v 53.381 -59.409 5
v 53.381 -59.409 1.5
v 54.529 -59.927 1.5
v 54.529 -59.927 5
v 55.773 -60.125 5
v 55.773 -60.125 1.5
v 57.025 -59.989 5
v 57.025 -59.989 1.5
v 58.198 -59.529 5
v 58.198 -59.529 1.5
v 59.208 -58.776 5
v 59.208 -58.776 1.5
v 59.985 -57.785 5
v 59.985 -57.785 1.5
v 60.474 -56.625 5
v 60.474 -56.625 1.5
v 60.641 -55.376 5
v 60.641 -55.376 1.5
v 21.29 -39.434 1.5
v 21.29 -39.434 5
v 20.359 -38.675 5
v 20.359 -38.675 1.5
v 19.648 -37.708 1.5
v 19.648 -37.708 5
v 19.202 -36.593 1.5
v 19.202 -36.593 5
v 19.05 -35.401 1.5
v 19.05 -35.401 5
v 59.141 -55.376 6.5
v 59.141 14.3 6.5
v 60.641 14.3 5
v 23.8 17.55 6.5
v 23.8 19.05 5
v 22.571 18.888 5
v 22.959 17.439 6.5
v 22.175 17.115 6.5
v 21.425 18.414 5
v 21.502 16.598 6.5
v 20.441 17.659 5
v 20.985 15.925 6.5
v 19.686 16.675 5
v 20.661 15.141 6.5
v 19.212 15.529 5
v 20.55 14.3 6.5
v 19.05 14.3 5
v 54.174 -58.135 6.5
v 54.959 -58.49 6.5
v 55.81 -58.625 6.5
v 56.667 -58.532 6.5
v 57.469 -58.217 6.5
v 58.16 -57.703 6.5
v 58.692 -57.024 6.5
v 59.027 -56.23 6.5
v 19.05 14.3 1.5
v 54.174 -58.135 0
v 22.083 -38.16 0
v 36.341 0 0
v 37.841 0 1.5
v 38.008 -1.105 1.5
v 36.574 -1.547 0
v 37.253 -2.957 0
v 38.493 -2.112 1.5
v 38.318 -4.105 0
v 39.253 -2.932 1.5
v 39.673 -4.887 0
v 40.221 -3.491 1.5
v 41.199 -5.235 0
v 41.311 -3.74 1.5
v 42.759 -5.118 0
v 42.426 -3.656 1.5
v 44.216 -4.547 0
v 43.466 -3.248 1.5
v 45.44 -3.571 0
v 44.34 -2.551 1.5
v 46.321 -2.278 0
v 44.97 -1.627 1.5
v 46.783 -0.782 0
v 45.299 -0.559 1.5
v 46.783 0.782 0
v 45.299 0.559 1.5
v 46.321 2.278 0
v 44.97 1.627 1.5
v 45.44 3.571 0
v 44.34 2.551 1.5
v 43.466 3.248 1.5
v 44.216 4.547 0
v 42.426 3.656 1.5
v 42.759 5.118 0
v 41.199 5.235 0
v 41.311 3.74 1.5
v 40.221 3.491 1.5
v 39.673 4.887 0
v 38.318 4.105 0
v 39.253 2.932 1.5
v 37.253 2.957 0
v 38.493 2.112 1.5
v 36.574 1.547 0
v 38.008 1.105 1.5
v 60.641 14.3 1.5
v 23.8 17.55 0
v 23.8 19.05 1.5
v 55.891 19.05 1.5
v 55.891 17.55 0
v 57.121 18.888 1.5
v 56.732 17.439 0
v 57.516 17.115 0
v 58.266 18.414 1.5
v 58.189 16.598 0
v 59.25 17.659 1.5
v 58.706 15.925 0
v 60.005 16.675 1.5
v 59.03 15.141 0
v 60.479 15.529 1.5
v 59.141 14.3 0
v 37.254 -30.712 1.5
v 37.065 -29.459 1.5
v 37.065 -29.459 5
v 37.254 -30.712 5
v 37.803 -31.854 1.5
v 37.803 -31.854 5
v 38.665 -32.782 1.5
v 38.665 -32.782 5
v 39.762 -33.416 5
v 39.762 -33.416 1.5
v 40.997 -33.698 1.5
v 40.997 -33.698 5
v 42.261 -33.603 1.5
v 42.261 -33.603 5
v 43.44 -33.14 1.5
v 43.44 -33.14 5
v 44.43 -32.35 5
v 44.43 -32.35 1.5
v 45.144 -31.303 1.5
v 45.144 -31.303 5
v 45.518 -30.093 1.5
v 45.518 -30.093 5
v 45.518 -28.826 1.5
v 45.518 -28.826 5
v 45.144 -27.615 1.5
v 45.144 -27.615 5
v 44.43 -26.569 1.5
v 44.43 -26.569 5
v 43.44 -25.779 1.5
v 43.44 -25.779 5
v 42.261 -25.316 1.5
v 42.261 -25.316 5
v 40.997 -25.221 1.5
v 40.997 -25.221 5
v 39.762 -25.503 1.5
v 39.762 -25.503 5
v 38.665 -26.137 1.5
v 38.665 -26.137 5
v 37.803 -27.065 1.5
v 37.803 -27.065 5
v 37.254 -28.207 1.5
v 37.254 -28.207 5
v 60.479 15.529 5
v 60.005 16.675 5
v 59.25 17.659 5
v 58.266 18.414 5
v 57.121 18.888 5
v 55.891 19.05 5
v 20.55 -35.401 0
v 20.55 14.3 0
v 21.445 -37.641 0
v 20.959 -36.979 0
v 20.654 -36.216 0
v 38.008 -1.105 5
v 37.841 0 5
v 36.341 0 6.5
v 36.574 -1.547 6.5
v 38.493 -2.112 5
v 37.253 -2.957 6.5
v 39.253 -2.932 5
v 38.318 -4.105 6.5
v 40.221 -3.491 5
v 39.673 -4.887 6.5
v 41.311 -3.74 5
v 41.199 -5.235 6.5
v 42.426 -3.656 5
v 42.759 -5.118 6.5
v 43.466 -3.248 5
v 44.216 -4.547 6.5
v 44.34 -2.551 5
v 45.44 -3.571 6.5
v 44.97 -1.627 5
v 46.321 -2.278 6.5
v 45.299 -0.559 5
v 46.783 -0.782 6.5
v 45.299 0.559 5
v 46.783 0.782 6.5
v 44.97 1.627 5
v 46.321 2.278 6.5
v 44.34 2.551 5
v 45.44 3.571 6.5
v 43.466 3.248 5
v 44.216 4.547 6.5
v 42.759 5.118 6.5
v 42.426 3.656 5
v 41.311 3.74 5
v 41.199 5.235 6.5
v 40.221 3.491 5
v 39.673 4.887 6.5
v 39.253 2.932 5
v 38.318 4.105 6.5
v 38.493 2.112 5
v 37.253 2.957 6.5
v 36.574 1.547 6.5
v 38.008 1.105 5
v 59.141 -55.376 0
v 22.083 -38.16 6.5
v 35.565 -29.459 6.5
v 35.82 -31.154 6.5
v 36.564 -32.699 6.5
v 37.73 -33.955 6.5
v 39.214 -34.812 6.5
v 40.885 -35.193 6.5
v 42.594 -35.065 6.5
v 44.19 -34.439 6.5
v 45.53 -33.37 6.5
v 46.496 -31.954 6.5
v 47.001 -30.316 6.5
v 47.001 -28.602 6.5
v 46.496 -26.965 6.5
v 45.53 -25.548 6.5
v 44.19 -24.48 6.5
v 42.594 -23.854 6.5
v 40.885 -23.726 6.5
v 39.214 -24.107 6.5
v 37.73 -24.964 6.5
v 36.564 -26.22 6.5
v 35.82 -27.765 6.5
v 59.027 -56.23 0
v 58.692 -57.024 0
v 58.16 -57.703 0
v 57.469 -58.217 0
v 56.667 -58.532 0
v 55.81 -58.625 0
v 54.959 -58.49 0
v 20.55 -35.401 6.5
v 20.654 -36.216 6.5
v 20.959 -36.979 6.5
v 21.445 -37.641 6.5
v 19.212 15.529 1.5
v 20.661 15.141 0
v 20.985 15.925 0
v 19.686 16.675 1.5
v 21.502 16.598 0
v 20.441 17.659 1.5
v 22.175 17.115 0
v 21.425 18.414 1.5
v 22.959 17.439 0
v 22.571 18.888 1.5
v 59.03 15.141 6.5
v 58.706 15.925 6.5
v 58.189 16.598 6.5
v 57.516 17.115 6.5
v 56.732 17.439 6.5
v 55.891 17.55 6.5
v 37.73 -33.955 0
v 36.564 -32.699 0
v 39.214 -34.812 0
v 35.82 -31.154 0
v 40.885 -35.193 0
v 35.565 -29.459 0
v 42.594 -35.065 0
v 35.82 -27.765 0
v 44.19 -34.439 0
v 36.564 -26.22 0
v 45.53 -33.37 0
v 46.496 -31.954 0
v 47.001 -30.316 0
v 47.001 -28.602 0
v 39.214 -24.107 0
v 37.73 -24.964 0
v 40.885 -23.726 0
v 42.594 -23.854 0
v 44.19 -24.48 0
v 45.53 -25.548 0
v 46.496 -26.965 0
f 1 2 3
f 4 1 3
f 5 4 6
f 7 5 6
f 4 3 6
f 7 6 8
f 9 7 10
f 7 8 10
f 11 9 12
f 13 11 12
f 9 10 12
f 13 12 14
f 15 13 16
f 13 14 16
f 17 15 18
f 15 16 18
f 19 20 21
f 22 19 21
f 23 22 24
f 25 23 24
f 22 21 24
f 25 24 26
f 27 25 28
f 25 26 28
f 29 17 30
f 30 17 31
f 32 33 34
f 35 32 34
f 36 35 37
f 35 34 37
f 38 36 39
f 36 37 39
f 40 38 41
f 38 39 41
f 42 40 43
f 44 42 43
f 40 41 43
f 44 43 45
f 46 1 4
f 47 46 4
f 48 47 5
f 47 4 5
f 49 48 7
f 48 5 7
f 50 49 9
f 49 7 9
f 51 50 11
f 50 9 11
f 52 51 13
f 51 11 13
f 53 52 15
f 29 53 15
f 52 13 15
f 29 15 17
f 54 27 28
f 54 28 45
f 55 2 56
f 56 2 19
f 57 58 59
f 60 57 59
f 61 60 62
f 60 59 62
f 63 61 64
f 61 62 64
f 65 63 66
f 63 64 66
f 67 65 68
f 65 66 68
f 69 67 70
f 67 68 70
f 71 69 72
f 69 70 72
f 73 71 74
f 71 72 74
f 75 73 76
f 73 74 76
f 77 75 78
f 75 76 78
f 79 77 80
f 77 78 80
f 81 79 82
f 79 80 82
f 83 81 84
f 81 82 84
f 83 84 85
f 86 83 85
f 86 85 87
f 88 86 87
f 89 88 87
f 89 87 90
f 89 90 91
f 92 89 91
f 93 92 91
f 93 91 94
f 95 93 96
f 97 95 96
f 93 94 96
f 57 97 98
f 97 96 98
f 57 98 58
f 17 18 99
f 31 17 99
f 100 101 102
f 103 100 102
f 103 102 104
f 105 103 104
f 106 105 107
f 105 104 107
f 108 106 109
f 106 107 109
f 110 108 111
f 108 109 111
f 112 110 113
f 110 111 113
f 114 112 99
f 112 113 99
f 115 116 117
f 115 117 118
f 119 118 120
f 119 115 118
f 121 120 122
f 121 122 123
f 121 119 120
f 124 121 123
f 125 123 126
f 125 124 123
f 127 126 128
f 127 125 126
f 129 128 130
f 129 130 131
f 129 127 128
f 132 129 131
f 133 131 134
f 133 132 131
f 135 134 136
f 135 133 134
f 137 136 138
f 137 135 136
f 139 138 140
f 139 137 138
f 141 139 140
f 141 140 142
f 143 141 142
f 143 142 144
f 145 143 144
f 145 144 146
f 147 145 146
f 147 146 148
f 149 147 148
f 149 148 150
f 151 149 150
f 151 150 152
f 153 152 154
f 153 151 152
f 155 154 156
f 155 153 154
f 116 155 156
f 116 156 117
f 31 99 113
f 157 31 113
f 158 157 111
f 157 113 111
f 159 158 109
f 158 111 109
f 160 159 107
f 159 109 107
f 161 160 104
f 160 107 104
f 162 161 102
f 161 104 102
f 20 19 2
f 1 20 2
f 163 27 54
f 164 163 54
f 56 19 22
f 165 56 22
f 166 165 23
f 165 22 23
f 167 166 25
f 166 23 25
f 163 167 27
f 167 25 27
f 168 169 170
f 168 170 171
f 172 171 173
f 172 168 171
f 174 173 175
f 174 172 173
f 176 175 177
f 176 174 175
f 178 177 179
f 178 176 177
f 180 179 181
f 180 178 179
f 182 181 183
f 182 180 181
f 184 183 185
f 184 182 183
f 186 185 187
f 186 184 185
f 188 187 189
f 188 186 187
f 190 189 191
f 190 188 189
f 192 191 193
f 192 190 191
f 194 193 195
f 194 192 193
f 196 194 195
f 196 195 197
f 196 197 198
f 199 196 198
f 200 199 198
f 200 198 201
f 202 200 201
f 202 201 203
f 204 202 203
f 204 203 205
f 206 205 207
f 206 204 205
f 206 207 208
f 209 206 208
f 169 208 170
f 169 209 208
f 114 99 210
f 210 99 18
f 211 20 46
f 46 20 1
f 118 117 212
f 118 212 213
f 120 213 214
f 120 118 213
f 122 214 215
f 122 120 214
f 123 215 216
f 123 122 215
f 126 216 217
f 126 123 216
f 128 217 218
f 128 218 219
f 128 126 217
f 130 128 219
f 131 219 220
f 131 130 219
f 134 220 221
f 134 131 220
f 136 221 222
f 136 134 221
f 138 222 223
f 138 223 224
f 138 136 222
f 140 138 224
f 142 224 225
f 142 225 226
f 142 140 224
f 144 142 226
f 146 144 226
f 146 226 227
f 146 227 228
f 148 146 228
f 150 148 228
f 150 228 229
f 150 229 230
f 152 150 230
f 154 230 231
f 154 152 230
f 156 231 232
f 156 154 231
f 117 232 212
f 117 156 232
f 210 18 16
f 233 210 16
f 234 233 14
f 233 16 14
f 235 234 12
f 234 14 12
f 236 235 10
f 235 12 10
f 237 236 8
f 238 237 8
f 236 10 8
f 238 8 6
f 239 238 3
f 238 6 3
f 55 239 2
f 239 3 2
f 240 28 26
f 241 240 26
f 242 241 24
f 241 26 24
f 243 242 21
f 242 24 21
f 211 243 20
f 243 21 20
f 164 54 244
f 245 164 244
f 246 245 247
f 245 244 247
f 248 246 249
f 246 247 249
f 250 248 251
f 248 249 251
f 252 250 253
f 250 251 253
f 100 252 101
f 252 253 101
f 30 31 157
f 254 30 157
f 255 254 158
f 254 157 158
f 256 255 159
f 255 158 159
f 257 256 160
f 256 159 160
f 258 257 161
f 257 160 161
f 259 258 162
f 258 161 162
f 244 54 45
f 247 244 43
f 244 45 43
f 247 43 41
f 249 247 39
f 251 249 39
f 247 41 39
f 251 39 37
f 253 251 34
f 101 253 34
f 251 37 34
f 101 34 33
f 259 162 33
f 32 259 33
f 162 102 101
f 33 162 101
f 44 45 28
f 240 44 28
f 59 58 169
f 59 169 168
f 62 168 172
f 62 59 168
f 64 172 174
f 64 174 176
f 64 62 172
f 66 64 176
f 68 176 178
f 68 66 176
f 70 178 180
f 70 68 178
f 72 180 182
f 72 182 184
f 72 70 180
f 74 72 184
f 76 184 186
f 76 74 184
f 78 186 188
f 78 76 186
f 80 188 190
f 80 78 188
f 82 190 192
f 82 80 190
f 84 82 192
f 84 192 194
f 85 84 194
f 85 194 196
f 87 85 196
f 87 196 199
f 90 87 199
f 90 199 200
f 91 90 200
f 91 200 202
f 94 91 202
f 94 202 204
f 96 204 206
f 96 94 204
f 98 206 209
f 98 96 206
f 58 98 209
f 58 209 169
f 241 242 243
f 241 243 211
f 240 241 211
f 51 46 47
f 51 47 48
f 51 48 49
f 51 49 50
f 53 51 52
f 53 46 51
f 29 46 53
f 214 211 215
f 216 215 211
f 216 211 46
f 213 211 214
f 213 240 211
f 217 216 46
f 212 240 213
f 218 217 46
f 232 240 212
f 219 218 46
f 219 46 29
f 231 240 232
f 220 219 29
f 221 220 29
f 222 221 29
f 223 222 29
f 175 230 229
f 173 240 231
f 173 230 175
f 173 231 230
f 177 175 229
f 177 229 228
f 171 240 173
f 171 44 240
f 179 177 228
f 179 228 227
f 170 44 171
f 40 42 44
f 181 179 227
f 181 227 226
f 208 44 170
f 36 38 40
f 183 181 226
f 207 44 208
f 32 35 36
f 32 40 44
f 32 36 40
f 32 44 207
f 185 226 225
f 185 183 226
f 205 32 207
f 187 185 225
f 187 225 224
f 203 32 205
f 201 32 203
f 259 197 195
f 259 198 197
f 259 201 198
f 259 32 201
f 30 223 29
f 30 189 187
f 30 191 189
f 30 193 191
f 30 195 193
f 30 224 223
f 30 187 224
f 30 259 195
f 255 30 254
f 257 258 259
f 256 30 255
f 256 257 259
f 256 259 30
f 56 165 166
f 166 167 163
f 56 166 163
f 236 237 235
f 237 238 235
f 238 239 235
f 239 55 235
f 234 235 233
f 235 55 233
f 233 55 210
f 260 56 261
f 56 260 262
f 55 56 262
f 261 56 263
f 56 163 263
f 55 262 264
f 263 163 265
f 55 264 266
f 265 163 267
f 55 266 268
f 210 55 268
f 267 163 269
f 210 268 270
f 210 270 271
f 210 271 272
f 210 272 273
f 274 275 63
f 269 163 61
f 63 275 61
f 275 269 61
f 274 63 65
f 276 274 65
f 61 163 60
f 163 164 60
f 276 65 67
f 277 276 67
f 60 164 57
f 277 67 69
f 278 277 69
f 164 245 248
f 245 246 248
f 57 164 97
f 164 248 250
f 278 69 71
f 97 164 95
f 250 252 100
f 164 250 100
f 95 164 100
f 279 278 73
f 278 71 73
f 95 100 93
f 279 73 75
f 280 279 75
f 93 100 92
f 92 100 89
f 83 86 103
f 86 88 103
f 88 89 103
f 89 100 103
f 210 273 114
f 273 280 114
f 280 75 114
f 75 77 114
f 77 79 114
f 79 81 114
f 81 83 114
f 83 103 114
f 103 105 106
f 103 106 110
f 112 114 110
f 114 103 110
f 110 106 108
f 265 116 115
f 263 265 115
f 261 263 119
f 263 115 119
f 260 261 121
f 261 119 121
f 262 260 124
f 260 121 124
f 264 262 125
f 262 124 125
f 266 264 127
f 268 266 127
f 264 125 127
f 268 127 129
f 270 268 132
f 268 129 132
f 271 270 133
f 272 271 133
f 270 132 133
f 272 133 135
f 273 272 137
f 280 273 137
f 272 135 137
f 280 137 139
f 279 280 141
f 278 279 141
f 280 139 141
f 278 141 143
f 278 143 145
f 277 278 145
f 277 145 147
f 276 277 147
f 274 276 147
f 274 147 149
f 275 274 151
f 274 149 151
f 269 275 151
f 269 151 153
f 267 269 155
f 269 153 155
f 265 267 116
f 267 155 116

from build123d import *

# Parameters (mm, degrees)
SKETCH1_R           = 4.25
SKETCH1_R_2         = 3.75
SKETCH1_R_3         = 4.5
BOSS_EXTRUDE1_DEPTH = 6.5
CUT_EXTRUDE1_DEPTH  = 10
FILLET1_R           = 4.75
CHAMFER1_SIZE       = 1.5


with BuildPart() as part:
    # Sketch1 → Boss-Extrude1 (new body)
    with BuildSketch(Plane.XY):
        with BuildLine():
            Line((-11.458079381, -19.05), (53.381074139, -59.408818568))
            ThreePointArc((53.381074139, -59.408818568), (58.197626483, -59.528635467), (60.641156228, -55.376203052))
            Line((60.641156228, -55.376203052), (60.641156228, 14.3))
            ThreePointArc((60.641156228, 14.3), (59.249913439, 17.658757211), (55.891156228, 19.05))
            Line((55.891156228, 19.05), (-13.723477062, 19.05))
            ThreePointArc((-13.723477062, 19.05), (-14.628464695, 18.040083046), (-15.73121772, 18.829304583))
            ThreePointArc((-15.73121772, 18.829304583), (-17.658815789, 17.658815789), (-18.829304583, 15.73121772))
            ThreePointArc((-18.829304583, 15.73121772), (-18.040083046, 14.628464695), (-19.05, 13.723477062))
            Line((-19.05, 13.723477062), (-19.05, 8.996305235))
            ThreePointArc((-19.05, 8.996305235), (-18.034, 7.980305235), (-19.05, 6.964305235))
            Line((-19.05, 6.964305235), (-19.05, -6.964305235))
            ThreePointArc((-19.05, -6.964305235), (-18.034, -7.980305235), (-19.05, -8.996305235))
            Line((-19.05, -8.996305235), (-19.05, -13.723477062))
            ThreePointArc((-19.05, -13.723477062), (-18.040083046, -14.628464695), (-18.829304583, -15.73121772))
            ThreePointArc((-18.829304583, -15.73121772), (-17.658815789, -17.658815789), (-15.73121772, -18.829304583))
            ThreePointArc((-15.73121772, -18.829304583), (-14.628464695, -18.040083046), (-13.723477062, -19.05))
            Line((-13.723477062, -19.05), (-11.458079381, -19.05))
        make_face()
        with Locations(Location((41.314990606, -29.4594322, 0), (0, 0, 180))):
            Circle(SKETCH1_R, mode=Mode.SUBTRACT)
        with Locations(Location((41.591156228, 0, 0), (0, 0, 180))):
            Circle(SKETCH1_R_2, mode=Mode.SUBTRACT)
        with Locations(Location((0, 0, 0), (0, 0, 180))):
            Circle(SKETCH1_R_3, mode=Mode.SUBTRACT)
    extrude(amount=BOSS_EXTRUDE1_DEPTH)

    # Sketch3 → Cut-Extrude1 (cut)
    with BuildSketch(Plane(origin=(0, 0, 0), x_dir=(-1, 0, 0), z_dir=(0, 0, -1))):
        with BuildLine():
            Line((19.05, 6.964305235), (19.05, -6.964305235))
            Line((19.05, -6.964305235), (19.05, -13.723477062))
            Line((19.05, -13.723477062), (18.829304583, -15.73121772))
            ThreePointArc((18.829304583, -15.73121772), (17.658815789, -17.658815789), (15.73121772, -18.829304583))
            Line((15.73121772, -18.829304583), (13.723477062, -19.05))
            Line((13.723477062, -19.05), (11.458079381, -19.05))
            Line((11.458079381, -19.05), (-19.05, -38.039606954))
            Line((-19.05, -38.039606954), (-19.05, 8.996305235))
            Line((-19.05, 8.996305235), (-19.05, 13.723477062))
            Line((-19.05, 13.723477062), (-19.05, 19.05))
            Line((-19.05, 19.05), (13.723477062, 19.05))
            Line((13.723477062, 19.05), (15.73121772, 18.829304583))
            ThreePointArc((15.73121772, 18.829304583), (17.658815789, 17.658815789), (18.829304583, 15.73121772))
            Line((18.829304583, 15.73121772), (19.05, 13.723477062))
            Line((19.05, 13.723477062), (19.05, 6.964305235))
        make_face()
    extrude(amount=-CUT_EXTRUDE1_DEPTH, mode=Mode.SUBTRACT)

    # Fillet1
    fillet1_edges = [part.edges().sort_by_distance(p)[0] for p in [
        (19.05, -38.039606954, 3.25),
        (19.05, 19.05, 3.25),
    ]]
    fillet(fillet1_edges, radius=FILLET1_R)

    # Chamfer1
    chamfer1_edges = [part.edges().sort_by_distance(p)[0] for p in [
        (45.341156228, 0, 6.5),
        (45.564990606, -29.4594322, 6.5),
        (19.05, -10.550608772, 0),
        (20.441242789, 17.658757211, 0),
        (19.647567585, -37.707687799, 0),
        (19.05, -10.550608772, 6.5),
        (20.441242789, 17.658757211, 6.5),
        (19.647567585, -37.707687799, 6.5),
        (37.335496024, -49.421325814, 6.5),
        (45.564990606, -29.4594322, 0),
        (45.341156228, 0, 0),
        (58.197626483, -59.528635467, 6.5),
        (60.641156228, -20.538101526, 6.5),
        (39.845578114, 19.05, 0),
        (59.249913439, 17.658757211, 0),
        (60.641156228, -20.538101526, 0),
        (58.197626483, -59.528635467, 0),
        (37.335496024, -49.421325814, 0),
        (59.249913439, 17.658757211, 6.5),
        (39.845578114, 19.05, 6.5),
    ]]
    chamfer(chamfer1_edges, length=CHAMFER1_SIZE)


solid = part.part
